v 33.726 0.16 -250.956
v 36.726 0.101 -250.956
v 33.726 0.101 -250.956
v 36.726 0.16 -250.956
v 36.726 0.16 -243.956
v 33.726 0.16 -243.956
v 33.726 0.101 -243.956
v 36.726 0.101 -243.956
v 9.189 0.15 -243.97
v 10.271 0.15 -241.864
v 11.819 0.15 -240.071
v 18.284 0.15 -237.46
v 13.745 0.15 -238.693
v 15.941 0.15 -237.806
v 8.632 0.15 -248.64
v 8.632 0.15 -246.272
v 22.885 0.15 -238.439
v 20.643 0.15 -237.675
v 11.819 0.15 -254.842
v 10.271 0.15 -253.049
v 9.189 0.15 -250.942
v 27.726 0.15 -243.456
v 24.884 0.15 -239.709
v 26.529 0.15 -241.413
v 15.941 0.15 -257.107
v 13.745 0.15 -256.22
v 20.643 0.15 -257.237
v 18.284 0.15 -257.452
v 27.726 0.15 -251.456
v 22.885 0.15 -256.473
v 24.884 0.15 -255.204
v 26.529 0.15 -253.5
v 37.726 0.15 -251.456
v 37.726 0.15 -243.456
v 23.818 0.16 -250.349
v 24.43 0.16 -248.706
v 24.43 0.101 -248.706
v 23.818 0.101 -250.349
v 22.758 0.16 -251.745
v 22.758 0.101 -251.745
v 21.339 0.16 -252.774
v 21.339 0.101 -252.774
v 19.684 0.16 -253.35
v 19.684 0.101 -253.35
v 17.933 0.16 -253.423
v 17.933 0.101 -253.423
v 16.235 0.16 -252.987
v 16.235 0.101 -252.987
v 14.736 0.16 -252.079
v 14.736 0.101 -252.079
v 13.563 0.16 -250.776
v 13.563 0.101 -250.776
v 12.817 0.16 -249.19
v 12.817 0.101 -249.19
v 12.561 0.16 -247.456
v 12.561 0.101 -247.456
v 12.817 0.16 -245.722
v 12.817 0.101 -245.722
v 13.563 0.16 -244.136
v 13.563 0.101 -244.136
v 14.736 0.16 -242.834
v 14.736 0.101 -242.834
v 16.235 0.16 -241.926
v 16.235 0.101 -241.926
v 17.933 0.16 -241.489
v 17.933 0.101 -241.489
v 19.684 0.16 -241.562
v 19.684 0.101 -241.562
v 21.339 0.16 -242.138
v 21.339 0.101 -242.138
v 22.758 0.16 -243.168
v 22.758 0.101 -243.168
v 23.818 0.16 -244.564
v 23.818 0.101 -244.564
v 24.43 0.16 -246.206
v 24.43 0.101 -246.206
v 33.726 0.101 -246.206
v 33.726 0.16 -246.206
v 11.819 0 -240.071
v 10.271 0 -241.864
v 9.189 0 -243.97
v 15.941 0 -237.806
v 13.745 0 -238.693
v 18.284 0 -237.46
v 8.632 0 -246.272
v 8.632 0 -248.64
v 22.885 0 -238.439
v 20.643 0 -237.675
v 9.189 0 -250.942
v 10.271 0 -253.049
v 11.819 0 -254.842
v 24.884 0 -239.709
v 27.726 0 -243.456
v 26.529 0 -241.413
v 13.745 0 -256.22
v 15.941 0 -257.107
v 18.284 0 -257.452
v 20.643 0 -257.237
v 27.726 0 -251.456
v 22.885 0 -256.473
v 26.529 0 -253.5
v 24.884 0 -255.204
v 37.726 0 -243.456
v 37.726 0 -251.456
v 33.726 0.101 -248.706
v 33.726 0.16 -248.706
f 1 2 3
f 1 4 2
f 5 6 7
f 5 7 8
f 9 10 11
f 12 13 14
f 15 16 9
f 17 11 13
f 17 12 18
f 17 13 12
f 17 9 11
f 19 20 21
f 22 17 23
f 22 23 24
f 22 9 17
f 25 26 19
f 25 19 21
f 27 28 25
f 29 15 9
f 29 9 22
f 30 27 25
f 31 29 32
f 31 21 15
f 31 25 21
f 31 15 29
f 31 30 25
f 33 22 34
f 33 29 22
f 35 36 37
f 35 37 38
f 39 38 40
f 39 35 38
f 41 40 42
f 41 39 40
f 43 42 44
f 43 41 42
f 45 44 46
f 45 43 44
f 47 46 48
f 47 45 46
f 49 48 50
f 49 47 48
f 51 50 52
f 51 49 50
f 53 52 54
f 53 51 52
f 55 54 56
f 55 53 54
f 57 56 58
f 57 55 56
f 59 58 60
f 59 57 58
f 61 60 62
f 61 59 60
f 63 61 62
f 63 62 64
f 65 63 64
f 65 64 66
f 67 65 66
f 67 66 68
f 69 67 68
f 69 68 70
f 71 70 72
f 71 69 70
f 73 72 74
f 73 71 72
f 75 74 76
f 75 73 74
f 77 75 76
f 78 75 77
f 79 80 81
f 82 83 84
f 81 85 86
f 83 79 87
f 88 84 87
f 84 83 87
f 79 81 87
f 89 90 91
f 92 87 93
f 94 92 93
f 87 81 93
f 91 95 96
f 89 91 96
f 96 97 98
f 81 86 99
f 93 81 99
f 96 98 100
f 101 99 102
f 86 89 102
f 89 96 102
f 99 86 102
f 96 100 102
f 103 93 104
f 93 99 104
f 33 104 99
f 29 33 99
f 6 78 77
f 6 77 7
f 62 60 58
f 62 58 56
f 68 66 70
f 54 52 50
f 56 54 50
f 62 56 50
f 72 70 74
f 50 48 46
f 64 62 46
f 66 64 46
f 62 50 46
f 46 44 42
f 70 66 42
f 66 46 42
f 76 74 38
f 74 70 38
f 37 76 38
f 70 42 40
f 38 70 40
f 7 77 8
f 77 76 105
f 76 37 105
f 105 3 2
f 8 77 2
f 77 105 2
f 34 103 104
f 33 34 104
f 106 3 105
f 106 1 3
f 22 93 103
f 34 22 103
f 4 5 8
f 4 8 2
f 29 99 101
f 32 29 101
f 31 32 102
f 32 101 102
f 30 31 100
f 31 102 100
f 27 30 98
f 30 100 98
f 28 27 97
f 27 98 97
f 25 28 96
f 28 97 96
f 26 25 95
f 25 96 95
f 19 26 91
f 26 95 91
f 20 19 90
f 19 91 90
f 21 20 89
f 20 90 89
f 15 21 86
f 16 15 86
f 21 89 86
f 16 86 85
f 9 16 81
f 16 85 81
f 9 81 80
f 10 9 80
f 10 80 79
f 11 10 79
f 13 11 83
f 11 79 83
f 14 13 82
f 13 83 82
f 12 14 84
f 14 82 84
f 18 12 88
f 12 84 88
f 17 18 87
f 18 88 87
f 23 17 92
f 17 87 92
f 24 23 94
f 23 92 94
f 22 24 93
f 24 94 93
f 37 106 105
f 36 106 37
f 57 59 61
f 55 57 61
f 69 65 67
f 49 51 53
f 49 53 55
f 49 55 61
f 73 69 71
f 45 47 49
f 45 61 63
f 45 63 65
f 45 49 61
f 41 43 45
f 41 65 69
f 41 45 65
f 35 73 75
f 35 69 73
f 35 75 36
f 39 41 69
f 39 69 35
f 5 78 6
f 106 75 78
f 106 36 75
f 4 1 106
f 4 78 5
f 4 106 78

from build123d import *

# Parameters (mm, degrees)
BOSS_EXTRUDE1_DEPTH      = 0.15
BOSS_EXTRUDE2_DEPTH      = 0.01
BOSS_EXTRUDE2_DEPTH_BACK = 0.049


with BuildPart() as part:
    # Sketch1 → Boss-Extrude1 (new body)
    with BuildSketch(Plane(origin=(0, 0, 0), x_dir=(1, 0, 0), z_dir=(0, 1, 0))):
        with BuildLine():
            Line((37.726430303, 251.456293434), (27.726430303, 251.456293434))
            ThreePointArc((27.726430303, 251.456293434), (8.561278913, 247.456293434), (27.726430303, 243.456293434))
            Line((27.726430303, 243.456293434), (37.726430303, 243.456293434))
            Line((37.726430303, 243.456293434), (37.726430303, 251.456293434))
        make_face()
    extrude(amount=BOSS_EXTRUDE1_DEPTH)


with BuildPart() as body_2:
    # Sketch2 → Boss-Extrude2 (new body, two sides)
    with BuildSketch(Plane(origin=(0, 0.15, 0), x_dir=(1, 0, 0), z_dir=(0, 1, 0))) as boss_extrude2_sk:
        with BuildLine():
            Line((33.726430303, 248.706293434), (24.42962621, 248.706293434))
            ThreePointArc((24.42962621, 248.706293434), (12.561278913, 247.456293434), (24.42962621, 246.206293434))
            Line((24.42962621, 246.206293434), (33.726430303, 246.206293434))
            Line((33.726430303, 246.206293434), (33.726430303, 243.956293434))
            Line((33.726430303, 243.956293434), (36.726430303, 243.956293434))
            Line((36.726430303, 243.956293434), (36.726430303, 250.956293434))
            Line((36.726430303, 250.956293434), (33.726430303, 250.956293434))
            Line((33.726430303, 250.956293434), (33.726430303, 248.706293434))
        make_face()
    extrude(amount=BOSS_EXTRUDE2_DEPTH)
    extrude(boss_extrude2_sk.sketch, amount=-BOSS_EXTRUDE2_DEPTH_BACK)


solid = Compound([part.part, body_2.part])
